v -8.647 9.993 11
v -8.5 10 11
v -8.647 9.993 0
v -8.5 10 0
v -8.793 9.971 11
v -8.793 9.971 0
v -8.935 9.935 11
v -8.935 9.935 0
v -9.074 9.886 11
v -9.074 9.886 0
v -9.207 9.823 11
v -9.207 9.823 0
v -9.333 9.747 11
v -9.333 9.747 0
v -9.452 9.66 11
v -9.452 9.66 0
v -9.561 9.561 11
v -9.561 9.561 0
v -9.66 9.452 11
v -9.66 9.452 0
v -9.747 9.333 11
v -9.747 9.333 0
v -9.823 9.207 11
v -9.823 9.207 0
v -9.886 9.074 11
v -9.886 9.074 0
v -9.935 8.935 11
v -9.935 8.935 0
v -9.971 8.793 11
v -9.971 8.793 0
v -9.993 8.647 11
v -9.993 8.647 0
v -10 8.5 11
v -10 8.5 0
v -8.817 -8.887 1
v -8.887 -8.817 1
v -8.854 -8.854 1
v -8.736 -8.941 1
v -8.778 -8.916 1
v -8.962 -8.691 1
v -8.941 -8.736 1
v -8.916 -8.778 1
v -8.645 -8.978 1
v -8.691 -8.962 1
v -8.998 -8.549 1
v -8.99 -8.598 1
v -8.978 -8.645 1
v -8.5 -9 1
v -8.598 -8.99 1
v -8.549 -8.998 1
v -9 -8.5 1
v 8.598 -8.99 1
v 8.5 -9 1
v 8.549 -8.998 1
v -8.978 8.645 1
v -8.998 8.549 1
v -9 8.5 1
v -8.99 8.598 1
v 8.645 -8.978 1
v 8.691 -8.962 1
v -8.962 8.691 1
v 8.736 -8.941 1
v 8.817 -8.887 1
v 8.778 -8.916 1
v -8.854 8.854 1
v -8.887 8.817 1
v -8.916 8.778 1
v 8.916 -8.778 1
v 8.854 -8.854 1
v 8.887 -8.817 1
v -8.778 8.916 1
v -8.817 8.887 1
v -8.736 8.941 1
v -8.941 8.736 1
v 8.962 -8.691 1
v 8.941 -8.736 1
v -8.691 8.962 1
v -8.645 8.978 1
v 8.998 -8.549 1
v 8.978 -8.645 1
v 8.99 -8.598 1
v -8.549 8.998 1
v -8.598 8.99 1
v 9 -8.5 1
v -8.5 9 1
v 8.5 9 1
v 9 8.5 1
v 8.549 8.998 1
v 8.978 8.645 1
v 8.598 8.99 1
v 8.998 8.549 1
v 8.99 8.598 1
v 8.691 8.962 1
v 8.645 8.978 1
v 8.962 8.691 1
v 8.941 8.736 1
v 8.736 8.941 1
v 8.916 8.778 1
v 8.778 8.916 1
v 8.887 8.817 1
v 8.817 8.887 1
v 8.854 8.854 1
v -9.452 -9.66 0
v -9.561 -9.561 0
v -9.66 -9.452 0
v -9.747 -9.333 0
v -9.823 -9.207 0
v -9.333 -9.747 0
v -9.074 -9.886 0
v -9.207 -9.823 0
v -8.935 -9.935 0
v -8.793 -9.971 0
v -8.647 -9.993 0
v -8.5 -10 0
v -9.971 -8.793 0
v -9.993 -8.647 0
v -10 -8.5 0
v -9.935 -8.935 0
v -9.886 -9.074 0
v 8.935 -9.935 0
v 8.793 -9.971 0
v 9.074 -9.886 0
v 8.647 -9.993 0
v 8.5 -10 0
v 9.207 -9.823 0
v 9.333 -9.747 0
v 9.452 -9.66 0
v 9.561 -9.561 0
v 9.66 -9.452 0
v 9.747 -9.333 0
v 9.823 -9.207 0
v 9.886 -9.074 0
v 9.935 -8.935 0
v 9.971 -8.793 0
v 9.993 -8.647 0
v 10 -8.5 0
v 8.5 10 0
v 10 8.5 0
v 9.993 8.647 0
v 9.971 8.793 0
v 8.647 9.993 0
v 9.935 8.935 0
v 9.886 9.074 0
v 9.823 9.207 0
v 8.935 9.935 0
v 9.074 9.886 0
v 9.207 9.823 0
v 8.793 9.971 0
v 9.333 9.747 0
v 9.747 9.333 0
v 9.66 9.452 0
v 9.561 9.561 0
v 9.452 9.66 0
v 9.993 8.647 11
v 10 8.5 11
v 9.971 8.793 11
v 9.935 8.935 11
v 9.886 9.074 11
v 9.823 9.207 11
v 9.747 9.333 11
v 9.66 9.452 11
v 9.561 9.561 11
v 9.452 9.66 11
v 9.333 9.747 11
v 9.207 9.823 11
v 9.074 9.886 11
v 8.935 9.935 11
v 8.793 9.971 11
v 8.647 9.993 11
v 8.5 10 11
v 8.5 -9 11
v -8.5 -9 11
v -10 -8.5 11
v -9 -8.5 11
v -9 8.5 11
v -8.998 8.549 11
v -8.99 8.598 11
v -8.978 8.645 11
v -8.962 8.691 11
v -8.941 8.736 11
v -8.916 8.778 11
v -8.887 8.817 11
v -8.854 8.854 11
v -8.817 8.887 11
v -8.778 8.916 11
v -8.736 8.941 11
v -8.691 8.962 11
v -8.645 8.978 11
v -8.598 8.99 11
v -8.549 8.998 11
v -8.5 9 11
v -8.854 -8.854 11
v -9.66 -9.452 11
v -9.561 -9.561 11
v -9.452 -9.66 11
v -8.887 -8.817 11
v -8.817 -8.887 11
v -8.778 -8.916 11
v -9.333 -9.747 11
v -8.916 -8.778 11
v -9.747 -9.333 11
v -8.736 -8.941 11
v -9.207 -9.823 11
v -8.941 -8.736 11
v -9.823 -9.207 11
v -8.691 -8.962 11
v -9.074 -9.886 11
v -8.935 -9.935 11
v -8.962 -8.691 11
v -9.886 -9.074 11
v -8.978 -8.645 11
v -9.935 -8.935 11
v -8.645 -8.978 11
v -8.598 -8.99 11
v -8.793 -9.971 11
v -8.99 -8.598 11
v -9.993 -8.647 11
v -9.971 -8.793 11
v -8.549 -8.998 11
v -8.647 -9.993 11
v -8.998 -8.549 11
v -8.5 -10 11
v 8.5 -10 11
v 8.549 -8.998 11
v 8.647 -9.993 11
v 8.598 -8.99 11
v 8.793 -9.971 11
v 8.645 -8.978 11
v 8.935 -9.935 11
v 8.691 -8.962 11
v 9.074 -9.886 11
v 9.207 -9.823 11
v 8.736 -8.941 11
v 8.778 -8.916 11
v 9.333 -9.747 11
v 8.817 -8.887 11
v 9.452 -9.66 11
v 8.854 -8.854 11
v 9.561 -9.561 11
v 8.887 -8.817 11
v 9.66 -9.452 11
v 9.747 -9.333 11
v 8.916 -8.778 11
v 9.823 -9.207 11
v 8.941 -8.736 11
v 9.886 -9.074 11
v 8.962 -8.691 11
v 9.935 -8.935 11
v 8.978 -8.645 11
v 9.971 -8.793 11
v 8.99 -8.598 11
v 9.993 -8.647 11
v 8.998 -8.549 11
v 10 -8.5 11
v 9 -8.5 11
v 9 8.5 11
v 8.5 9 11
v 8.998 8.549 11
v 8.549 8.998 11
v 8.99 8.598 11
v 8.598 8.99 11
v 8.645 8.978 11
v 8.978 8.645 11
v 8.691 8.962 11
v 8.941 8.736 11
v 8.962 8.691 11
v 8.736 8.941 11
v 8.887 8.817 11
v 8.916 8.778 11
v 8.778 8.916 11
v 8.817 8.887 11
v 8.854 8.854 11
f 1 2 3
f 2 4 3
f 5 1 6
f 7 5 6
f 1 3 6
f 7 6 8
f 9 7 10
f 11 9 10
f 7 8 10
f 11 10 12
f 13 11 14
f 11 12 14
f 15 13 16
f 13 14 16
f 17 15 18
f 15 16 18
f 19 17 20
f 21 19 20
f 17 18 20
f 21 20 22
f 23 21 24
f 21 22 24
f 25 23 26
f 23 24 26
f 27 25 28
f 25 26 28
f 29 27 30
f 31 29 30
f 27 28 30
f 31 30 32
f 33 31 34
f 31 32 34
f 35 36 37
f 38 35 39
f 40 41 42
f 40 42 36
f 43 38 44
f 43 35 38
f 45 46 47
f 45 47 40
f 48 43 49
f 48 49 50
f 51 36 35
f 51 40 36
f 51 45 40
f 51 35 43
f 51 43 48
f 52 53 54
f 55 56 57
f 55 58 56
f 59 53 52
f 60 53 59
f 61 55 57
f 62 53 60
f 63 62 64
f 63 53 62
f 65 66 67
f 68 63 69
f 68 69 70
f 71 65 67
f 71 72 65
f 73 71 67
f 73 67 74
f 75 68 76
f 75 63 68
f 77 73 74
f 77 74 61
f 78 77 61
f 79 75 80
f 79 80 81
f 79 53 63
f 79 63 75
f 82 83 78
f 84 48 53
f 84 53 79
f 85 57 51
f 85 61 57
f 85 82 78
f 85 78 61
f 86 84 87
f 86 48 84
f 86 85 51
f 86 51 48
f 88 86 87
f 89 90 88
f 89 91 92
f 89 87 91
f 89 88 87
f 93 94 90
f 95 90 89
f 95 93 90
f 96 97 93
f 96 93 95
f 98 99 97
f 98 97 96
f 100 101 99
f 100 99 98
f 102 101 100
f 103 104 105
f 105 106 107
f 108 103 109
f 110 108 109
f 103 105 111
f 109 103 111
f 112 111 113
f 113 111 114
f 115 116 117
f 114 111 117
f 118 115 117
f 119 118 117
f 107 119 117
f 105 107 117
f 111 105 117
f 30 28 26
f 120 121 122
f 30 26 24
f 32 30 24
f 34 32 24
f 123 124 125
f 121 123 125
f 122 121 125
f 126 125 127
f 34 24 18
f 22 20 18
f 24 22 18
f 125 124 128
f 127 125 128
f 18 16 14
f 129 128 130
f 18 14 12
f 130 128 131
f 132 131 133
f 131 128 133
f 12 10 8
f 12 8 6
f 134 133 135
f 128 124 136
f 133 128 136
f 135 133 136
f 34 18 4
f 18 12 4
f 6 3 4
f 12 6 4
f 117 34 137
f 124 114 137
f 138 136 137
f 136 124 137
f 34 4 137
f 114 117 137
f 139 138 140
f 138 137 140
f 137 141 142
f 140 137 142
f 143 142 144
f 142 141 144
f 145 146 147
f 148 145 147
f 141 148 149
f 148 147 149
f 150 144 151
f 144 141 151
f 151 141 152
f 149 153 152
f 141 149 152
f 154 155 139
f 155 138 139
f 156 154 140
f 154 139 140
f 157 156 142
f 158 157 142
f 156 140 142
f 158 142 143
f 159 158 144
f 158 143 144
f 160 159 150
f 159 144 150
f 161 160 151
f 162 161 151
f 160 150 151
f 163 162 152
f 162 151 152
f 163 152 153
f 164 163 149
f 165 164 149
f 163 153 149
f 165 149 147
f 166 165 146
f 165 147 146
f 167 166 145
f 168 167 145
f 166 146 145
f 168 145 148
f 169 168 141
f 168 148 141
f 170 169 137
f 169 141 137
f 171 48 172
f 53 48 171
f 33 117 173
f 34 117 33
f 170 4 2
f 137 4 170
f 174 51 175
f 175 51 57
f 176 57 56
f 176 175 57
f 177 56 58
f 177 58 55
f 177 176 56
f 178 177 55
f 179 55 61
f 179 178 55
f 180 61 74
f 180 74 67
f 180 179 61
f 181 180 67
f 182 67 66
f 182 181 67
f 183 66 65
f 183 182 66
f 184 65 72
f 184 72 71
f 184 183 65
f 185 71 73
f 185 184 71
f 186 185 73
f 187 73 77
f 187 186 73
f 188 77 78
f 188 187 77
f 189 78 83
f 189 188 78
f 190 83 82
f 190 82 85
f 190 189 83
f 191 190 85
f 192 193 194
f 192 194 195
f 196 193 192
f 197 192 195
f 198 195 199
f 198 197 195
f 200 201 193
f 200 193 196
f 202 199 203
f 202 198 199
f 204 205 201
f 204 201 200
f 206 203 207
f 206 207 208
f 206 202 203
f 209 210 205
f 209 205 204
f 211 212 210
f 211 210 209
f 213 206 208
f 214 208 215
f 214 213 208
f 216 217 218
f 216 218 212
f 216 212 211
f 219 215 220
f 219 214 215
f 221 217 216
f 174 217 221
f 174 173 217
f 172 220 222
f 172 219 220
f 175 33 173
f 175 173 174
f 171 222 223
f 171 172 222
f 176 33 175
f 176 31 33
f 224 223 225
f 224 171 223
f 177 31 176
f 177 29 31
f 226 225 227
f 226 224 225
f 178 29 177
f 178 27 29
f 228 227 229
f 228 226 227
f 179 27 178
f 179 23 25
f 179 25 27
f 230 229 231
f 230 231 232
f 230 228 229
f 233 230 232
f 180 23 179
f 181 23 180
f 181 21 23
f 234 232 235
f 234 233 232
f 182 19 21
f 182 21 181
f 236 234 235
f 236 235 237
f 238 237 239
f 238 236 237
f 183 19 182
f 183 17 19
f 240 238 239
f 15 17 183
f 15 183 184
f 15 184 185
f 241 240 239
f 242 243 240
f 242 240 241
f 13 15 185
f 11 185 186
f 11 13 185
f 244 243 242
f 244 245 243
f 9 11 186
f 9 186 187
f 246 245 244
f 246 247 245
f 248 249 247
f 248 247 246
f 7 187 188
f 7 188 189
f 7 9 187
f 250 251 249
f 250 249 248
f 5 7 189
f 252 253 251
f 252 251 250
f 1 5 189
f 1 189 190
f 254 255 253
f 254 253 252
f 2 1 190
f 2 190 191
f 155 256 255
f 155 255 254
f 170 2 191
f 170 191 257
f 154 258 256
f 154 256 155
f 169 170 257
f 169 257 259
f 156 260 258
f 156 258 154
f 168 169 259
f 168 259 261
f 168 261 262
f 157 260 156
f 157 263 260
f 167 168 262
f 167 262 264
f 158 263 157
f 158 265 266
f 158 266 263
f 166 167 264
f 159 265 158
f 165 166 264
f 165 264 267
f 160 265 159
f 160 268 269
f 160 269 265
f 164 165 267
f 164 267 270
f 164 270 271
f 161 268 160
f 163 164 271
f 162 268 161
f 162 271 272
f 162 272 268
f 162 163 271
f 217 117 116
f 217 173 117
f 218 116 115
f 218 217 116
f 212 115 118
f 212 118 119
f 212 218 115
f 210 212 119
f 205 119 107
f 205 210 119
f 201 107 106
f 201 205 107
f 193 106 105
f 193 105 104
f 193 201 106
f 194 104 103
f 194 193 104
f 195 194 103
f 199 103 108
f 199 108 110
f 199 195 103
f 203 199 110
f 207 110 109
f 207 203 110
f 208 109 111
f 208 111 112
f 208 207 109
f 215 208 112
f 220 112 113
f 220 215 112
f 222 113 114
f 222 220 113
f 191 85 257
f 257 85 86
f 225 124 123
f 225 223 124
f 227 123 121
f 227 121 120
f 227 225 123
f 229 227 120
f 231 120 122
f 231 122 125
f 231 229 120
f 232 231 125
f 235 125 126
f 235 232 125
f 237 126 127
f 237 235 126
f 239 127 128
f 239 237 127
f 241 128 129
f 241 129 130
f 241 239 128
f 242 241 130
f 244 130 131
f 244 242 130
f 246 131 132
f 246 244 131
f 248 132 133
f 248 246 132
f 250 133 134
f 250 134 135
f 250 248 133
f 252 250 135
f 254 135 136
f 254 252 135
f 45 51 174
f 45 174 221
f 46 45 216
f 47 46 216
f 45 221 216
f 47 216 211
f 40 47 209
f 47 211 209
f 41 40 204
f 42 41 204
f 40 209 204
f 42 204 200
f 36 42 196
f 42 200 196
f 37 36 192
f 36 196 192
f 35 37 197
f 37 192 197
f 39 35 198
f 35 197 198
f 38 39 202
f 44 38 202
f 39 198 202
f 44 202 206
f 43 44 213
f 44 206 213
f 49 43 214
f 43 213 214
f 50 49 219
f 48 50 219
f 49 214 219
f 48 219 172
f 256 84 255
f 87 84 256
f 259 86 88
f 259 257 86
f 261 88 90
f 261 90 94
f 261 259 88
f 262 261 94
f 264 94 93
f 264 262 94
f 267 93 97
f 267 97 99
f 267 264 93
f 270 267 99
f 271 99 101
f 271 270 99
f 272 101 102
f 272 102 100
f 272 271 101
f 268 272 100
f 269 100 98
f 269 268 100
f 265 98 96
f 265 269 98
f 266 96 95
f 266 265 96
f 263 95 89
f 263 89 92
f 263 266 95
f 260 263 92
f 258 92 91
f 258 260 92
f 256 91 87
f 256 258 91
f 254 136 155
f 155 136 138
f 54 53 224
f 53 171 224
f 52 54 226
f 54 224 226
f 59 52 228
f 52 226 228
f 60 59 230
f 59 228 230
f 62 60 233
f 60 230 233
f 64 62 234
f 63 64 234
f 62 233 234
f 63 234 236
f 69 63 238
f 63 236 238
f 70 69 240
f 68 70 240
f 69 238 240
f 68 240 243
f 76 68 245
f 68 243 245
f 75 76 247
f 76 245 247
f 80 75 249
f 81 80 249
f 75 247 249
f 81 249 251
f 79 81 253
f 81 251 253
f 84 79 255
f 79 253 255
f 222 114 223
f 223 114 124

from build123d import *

# Parameters (mm, degrees)
F0_W     = 20
F0_H     = 20
F1_DEPTH = 1
F2_W     = 20
F2_H     = 20
F2_W_2   = 18
F2_H_2   = 18
F3_DEPTH = 10
F4_R     = 1.5
F5_R     = 0.5
F6_R     = 1.5
F7_R     = 1.5
F8_R     = 1.5
F9_R     = 0.5
F10_R    = 0.5
F11_R    = 0.5


with BuildPart() as f1:
    # F0 (on Top) → F1 (new body)
    with BuildSketch(Plane.XY):
        Rectangle(F0_W, F0_H)
    extrude(amount=F1_DEPTH)

    # F2 (on face) → F3 (join)
    with BuildSketch(Plane.XY.offset(1)):
        Rectangle(F2_W, F2_H)
        Rectangle(F2_W_2, F2_H_2, mode=Mode.SUBTRACT)
    extrude(amount=F3_DEPTH)

    # F4
    f4_edges = [f1.edges().sort_by_distance(p)[0] for p in [
        (10, -10, 5.5),
    ]]
    fillet(f4_edges, radius=F4_R)

    # F5
    f5_edges = [f1.edges().sort_by_distance(p)[0] for p in [
        (9, -9, 6),
    ]]
    fillet(f5_edges, radius=F5_R)

    # F6
    f6_edges = [f1.edges().sort_by_distance(p)[0] for p in [
        (10, 10, 5.5),
    ]]
    fillet(f6_edges, radius=F6_R)

    # F7
    f7_edges = [f1.edges().sort_by_distance(p)[0] for p in [
        (-10, 10, 5.5),
    ]]
    fillet(f7_edges, radius=F7_R)

    # F8
    f8_edges = [f1.edges().sort_by_distance(p)[0] for p in [
        (-10, -10, 5.5),
    ]]
    fillet(f8_edges, radius=F8_R)

    # F9
    f9_edges = [f1.edges().sort_by_distance(p)[0] for p in [
        (-9, 9, 6),
    ]]
    fillet(f9_edges, radius=F9_R)

    # F10
    f10_edges = [f1.edges().sort_by_distance(p)[0] for p in [
        (9, 9, 6),
    ]]
    fillet(f10_edges, radius=F10_R)

    # F11
    f11_edges = [f1.edges().sort_by_distance(p)[0] for p in [
        (-9, -9, 6),
    ]]
    fillet(f11_edges, radius=F11_R)


solid = f1.part
